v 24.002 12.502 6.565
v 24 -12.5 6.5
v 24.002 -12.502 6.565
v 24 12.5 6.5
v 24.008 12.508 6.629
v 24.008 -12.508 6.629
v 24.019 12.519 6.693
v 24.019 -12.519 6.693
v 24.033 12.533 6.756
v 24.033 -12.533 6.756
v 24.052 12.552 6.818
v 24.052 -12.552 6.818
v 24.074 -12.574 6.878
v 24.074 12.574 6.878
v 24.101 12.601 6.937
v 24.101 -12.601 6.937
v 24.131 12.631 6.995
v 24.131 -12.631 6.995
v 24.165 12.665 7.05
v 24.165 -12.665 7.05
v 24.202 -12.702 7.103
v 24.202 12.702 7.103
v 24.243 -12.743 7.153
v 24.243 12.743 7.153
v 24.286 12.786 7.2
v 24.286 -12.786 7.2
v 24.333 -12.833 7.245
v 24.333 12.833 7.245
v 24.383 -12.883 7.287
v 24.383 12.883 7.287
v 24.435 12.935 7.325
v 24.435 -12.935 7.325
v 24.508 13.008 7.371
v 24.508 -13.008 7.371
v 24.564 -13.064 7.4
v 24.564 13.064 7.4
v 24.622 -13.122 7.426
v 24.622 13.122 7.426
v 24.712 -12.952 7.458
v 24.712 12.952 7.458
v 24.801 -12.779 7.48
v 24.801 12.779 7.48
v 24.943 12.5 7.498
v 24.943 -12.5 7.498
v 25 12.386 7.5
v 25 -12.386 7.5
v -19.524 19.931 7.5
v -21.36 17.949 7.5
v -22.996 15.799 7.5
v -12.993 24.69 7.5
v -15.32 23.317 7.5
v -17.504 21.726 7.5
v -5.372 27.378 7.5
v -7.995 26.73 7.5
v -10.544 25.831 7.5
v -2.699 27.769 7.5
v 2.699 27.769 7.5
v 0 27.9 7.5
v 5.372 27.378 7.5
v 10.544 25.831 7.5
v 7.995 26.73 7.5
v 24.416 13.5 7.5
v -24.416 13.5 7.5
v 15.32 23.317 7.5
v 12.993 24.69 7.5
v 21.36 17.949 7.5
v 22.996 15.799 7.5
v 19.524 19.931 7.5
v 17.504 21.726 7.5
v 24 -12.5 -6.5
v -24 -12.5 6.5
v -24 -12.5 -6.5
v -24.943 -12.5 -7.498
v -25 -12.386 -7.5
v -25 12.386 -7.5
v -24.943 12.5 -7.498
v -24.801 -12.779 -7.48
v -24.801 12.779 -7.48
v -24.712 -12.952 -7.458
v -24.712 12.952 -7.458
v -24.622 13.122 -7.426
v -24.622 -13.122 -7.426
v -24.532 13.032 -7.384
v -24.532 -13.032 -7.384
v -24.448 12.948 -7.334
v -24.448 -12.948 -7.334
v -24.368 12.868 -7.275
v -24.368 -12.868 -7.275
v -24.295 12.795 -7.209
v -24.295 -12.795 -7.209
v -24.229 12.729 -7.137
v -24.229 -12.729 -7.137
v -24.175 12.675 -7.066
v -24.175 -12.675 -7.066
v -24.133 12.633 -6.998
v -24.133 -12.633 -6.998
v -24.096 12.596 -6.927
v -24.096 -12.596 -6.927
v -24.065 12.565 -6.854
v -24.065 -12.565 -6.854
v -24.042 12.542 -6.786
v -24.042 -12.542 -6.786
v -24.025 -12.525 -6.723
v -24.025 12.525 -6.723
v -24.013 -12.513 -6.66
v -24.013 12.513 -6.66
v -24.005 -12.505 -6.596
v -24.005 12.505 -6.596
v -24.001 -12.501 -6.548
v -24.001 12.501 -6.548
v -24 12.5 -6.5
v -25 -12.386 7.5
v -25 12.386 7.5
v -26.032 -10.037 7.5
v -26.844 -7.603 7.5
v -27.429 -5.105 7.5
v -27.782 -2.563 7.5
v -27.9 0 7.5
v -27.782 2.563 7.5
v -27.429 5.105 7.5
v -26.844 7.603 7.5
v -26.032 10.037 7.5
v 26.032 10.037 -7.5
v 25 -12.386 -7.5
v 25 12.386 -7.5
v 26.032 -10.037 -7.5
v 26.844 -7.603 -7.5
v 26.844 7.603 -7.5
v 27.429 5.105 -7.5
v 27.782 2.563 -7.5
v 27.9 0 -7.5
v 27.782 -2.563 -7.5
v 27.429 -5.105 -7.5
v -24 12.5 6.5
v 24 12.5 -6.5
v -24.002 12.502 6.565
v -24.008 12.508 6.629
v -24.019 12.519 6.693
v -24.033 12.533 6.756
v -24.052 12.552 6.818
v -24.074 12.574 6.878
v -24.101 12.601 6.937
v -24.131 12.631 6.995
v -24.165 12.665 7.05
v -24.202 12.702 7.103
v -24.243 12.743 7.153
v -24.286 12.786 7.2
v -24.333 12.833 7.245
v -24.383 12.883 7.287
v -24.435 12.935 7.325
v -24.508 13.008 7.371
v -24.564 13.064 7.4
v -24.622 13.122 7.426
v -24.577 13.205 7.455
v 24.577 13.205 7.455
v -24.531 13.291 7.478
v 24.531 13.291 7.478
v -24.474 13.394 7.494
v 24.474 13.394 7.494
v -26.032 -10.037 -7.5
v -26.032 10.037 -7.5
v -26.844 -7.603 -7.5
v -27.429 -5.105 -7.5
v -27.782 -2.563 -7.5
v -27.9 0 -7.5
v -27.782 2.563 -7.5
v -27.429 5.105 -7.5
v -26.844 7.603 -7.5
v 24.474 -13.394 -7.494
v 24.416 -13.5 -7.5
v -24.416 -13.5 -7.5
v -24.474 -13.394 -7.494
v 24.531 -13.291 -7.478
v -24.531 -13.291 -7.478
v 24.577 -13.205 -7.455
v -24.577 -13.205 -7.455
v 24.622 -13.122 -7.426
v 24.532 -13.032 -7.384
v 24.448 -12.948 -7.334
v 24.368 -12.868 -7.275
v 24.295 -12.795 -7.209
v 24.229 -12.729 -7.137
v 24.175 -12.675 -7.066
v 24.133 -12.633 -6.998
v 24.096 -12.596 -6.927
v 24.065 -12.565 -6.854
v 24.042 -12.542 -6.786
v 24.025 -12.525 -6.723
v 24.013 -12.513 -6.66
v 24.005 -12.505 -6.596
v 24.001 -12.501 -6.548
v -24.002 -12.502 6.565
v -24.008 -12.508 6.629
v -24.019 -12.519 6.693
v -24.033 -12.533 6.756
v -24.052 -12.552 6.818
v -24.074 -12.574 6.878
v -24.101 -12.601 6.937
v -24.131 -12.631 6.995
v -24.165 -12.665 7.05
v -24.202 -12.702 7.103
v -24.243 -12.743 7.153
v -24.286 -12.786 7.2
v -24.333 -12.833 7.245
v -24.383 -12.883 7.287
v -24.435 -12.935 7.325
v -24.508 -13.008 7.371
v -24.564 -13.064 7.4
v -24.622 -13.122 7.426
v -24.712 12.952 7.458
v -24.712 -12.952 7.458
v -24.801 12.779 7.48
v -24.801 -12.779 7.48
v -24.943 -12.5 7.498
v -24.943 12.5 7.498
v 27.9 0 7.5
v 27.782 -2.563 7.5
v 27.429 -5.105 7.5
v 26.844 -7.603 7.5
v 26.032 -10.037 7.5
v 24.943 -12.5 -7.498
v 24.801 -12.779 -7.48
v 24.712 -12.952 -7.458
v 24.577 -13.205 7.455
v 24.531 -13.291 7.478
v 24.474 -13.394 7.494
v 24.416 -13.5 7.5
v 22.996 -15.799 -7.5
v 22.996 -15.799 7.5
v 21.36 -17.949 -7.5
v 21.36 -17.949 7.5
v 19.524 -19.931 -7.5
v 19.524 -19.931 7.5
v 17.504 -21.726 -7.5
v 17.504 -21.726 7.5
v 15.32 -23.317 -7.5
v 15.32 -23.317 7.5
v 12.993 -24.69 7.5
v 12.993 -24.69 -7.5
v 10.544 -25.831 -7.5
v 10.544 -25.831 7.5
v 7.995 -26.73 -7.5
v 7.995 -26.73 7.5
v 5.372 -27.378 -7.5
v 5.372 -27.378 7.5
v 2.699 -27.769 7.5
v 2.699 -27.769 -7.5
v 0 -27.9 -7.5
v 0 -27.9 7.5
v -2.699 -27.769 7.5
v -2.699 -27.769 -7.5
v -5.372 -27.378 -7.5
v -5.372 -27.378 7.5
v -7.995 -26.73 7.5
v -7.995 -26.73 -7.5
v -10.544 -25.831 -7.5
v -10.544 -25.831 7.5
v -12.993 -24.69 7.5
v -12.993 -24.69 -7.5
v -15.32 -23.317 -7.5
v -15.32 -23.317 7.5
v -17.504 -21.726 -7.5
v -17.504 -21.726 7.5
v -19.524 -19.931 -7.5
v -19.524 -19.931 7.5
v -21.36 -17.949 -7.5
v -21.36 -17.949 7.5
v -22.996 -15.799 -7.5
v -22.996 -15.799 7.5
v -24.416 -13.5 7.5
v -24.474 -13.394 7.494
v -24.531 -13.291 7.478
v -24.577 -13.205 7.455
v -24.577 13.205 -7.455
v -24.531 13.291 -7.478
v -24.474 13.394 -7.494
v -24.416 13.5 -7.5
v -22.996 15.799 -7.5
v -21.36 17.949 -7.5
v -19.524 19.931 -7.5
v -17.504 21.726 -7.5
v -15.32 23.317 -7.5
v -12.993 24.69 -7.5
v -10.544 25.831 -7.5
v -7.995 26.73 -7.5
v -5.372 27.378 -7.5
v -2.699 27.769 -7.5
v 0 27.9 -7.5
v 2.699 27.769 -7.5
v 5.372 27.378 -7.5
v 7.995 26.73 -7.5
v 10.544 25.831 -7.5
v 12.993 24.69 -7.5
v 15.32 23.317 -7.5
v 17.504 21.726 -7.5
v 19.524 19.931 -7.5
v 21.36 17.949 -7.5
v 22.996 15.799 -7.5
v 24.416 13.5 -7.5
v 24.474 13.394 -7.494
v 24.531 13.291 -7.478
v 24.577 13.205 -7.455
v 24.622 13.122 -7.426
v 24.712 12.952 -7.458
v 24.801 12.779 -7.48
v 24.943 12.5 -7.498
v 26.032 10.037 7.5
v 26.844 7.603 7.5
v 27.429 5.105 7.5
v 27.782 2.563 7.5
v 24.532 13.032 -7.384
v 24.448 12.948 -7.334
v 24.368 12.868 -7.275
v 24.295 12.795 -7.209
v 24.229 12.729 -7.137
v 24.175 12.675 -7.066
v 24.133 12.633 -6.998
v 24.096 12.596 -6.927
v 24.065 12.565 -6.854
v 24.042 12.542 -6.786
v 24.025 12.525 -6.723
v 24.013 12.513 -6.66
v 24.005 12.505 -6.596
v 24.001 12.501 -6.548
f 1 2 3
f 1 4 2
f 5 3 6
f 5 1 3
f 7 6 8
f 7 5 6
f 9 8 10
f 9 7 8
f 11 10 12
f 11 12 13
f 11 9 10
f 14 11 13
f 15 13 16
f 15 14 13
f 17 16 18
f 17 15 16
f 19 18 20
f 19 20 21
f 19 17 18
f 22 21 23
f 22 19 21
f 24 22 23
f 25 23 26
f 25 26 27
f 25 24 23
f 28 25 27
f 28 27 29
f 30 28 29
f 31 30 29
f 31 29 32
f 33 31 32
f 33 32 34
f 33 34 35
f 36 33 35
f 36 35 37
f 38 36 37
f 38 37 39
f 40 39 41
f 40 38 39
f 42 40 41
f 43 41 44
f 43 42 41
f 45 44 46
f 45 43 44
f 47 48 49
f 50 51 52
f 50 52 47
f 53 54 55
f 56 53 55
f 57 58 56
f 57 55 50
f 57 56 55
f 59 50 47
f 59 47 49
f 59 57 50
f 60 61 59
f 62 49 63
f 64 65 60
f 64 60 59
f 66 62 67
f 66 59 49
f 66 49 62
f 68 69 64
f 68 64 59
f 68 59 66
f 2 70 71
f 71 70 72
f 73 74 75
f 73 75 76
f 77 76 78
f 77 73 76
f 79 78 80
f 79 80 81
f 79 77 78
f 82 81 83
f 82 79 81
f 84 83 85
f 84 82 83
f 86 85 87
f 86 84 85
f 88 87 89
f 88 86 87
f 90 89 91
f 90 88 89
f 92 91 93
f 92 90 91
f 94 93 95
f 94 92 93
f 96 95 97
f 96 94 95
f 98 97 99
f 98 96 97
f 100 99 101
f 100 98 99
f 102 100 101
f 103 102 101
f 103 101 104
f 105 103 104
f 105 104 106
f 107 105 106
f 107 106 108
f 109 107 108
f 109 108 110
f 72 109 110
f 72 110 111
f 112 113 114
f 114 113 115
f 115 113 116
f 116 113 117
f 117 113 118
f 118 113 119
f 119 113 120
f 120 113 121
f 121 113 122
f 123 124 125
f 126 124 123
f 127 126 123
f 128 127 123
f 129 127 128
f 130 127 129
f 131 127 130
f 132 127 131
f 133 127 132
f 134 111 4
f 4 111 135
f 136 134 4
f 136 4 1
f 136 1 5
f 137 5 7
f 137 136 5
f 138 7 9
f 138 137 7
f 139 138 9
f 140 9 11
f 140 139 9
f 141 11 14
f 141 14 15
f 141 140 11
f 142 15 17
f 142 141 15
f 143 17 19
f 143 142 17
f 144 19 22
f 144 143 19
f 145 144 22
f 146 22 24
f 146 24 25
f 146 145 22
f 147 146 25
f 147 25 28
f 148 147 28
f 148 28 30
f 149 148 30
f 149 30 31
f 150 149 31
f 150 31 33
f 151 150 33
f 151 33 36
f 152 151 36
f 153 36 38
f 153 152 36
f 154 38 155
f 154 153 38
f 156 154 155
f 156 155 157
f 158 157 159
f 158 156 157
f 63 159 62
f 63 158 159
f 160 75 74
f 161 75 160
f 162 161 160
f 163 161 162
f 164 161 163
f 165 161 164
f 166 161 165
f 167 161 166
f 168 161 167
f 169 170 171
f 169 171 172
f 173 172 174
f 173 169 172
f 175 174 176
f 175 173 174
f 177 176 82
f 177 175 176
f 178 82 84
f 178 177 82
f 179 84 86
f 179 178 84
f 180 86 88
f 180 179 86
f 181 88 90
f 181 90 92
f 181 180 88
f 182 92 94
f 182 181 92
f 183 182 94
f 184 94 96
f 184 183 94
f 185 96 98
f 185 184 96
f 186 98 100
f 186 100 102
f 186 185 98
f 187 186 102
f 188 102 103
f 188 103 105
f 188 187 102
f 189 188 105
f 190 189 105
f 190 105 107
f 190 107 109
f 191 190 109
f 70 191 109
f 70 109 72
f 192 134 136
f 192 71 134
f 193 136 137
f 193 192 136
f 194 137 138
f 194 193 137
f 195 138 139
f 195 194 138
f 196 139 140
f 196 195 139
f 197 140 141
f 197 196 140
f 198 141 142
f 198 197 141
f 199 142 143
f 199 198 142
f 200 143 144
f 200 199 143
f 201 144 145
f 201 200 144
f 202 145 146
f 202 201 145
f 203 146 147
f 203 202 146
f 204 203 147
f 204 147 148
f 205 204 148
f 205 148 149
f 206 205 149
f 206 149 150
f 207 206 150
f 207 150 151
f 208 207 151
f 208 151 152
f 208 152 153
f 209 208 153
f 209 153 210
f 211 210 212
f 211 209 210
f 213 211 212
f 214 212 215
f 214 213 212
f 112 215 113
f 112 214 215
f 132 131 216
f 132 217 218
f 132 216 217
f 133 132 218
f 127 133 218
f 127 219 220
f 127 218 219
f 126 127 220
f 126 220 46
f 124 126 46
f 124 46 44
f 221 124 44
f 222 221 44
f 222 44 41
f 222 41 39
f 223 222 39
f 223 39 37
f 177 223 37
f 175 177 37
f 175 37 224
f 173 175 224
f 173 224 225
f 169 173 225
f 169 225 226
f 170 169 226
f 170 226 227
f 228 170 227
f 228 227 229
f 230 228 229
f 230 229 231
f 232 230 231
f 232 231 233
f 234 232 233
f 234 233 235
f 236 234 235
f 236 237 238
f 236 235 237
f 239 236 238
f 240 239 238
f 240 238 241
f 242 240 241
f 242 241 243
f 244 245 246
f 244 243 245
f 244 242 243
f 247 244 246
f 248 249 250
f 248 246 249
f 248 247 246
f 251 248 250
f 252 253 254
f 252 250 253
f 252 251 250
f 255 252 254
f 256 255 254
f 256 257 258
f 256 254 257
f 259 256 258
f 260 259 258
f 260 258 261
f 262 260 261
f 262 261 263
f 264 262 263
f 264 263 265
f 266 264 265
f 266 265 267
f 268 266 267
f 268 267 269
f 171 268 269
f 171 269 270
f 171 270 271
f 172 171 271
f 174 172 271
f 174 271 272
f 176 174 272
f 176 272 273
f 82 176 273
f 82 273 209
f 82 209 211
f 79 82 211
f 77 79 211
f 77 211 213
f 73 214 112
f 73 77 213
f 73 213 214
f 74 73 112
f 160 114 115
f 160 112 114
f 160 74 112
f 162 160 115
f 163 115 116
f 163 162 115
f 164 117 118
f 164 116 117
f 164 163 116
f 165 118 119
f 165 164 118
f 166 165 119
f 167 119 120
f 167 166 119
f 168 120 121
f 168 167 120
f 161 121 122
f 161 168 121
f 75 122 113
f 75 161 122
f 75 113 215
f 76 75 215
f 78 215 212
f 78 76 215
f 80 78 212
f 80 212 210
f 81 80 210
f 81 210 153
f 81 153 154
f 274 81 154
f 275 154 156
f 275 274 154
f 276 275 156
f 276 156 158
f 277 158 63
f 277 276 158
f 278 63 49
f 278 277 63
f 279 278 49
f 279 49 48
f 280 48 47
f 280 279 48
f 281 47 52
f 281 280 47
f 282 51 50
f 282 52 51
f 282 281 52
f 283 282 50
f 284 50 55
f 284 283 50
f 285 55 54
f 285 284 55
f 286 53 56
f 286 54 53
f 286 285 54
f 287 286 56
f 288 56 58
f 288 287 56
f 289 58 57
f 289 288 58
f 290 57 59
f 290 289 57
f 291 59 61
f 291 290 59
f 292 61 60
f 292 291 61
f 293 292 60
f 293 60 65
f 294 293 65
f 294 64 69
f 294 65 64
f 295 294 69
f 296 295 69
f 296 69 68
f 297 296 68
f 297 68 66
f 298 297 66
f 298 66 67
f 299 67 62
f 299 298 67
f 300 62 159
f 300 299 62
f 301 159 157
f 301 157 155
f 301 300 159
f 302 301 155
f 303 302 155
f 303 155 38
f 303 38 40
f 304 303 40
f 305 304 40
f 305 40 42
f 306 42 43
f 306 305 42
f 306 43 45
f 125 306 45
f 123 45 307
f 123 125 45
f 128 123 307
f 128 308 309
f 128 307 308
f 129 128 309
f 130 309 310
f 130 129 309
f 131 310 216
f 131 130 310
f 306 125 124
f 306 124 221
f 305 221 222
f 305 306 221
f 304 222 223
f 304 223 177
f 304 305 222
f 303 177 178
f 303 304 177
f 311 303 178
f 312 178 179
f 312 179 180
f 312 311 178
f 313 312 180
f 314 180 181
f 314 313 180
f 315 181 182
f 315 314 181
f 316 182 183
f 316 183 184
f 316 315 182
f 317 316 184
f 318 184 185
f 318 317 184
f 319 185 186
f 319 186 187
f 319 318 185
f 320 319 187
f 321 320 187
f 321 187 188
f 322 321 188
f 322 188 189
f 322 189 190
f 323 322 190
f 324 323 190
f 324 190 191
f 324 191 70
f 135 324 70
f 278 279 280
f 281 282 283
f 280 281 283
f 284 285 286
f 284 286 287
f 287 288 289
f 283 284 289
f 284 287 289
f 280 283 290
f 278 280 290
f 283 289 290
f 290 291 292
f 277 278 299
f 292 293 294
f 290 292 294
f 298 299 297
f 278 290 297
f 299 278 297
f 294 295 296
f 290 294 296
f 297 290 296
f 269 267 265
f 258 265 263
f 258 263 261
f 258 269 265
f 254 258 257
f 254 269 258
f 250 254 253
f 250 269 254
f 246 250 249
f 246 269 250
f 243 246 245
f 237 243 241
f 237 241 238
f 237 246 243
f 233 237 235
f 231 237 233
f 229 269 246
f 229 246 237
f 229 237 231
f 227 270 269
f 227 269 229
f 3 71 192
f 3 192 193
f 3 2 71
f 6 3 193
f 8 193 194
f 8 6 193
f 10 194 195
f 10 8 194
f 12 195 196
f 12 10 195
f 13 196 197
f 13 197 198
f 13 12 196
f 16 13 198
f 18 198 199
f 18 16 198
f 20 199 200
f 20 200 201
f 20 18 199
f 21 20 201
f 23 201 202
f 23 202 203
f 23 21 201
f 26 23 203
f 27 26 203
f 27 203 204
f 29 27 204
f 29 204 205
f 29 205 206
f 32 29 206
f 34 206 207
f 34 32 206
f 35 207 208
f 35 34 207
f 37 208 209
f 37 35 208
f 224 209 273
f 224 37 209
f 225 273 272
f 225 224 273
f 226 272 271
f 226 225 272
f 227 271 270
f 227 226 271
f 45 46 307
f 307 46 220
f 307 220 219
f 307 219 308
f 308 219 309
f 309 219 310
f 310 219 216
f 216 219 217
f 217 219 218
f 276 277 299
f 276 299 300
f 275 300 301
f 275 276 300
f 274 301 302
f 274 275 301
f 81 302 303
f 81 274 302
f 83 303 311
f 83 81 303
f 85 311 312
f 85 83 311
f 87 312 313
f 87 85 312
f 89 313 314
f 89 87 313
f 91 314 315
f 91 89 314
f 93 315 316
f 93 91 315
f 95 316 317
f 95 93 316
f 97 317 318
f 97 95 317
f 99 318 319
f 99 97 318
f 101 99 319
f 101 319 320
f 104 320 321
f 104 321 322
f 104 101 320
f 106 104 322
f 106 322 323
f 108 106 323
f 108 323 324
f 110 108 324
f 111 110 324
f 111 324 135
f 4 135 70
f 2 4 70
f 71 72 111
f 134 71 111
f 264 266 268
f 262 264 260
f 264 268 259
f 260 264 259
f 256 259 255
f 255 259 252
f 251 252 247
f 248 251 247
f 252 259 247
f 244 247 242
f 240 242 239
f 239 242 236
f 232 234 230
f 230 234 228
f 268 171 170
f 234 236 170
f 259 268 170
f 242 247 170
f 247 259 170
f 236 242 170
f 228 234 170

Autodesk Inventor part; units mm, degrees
ref_plane "YZ Plane" through (0, 0, 0) normal (1, 0, 0) x (0, 1, 0)
ref_plane "XZ Plane" through (0, 0, 0) normal (0, 1, 0) x (-1, 0, 0)
ref_plane "XY Plane" through (0, 0, 0) normal (0, 0, 1) x (1, 0, 0)
sketch "Sketch1" plane through (0, 0, 0) normal (0, 0, 1) x (1, 0, 0)
  circle A0 centre (0, 0) radius 27.9
  line L0 (-24, 12.5) -> (24, 12.5)
  line L1 (24, 12.5) -> (24, -12.5)
  line L2 (24, -12.5) -> (-24, -12.5)
  line L3 (-24, -12.5) -> (-24, 12.5)
  dimension "d0" = 55.8
  dimension "d1" = 48
  dimension "d2" = 24
  dimension "d3" = 25
  dimension "d4" = 12.5
extrude "Extrusion1" add sketch "Sketch1" along normal mid plane 15
fillet "Fillet1" radius 1 8 edges at (0, 12.5, 7.5) (-24, 0, 7.5) (0, -12.5, 7.5) (24, 0, 7.5) (0, 12.5, -7.5) (-24, 0, -7.5) (0, -12.5, -7.5) (24, 0, -7.5)
equation "\"d2\" = 0.5 * d1"
equation "\"d4\" = 0.5 * d3"
properties part number "soporte central pila"
